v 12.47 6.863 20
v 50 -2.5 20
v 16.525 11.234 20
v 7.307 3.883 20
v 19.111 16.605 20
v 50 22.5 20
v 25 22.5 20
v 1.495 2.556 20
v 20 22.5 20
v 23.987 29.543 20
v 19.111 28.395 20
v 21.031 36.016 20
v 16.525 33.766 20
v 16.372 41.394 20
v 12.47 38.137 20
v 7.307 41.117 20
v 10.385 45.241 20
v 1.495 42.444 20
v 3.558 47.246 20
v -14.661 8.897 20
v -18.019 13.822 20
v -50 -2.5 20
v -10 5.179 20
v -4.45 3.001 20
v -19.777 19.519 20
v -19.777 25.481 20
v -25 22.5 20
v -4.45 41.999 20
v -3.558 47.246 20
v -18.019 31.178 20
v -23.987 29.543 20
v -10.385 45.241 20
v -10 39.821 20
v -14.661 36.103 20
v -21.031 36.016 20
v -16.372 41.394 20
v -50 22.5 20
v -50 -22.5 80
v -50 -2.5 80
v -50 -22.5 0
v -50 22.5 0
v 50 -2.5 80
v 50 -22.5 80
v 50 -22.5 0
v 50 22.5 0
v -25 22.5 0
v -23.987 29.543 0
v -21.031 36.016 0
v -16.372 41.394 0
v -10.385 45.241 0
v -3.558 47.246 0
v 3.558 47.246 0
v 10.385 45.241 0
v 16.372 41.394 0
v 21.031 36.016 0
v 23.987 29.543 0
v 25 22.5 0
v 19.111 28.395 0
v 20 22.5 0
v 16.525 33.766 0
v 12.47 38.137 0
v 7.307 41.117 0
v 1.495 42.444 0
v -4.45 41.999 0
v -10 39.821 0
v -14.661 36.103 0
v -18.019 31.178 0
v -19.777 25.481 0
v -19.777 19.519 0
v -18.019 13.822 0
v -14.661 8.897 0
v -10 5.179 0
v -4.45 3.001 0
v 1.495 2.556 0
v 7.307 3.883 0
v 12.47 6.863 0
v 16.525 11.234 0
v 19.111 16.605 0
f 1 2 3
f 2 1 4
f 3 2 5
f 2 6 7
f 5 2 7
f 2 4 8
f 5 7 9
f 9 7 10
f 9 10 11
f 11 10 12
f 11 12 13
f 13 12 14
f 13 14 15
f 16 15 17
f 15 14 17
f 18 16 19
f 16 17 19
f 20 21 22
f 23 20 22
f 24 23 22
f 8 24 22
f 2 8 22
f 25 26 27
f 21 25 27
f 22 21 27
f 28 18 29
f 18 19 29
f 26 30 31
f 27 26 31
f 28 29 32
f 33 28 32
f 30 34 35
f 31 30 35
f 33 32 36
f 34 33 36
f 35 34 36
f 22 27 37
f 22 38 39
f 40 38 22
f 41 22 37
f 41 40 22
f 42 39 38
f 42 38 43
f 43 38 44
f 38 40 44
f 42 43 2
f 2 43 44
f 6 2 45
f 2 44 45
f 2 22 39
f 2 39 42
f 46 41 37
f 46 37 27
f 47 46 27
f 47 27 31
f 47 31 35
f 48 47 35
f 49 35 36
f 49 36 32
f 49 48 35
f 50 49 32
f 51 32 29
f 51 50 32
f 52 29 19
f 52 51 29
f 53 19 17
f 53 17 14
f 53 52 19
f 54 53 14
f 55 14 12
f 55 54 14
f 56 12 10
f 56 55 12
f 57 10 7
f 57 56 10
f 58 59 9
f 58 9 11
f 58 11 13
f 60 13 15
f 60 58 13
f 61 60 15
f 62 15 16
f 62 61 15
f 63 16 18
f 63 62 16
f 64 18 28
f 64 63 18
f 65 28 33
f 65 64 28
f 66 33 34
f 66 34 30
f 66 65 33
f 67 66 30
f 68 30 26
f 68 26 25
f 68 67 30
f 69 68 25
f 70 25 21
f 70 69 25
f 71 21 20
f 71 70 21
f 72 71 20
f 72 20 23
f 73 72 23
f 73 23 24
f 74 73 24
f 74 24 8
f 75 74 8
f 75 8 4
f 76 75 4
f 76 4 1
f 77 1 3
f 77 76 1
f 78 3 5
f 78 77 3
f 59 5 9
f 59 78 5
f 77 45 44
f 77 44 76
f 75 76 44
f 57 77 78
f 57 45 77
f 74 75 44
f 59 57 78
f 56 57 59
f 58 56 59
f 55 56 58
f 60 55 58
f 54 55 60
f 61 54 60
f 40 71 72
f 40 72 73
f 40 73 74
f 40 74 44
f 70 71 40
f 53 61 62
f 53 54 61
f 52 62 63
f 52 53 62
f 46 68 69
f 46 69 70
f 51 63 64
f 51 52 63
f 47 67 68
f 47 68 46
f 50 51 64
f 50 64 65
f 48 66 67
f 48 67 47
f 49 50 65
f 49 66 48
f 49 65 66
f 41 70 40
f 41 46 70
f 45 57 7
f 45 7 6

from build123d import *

# Parameters (mm, degrees)
SKETCH1_R           = 20
BOSS_EXTRUDE1_DEPTH = 20
SKETCH2_W           = 100
SKETCH2_H           = 20
BOSS_EXTRUDE2_DEPTH = 60


with BuildPart() as part:
    # Sketch1 → Boss-Extrude1 (new body)
    with BuildSketch(Plane.XY):
        with BuildLine():
            Line((-50, 22.5), (-25, 22.5))
            ThreePointArc((-25, 22.5), (0, 47.5), (25, 22.5))
            Line((25, 22.5), (50, 22.5))
            Line((50, 22.5), (50, -22.5))
            Line((50, -22.5), (-50, -22.5))
            Line((-50, -22.5), (-50, 22.5))
        make_face()
        with Locations((0, 22.5)):
            Circle(SKETCH1_R, mode=Mode.SUBTRACT)
    extrude(amount=BOSS_EXTRUDE1_DEPTH)

    # Sketch2 → Boss-Extrude2 (add)
    with BuildSketch(Plane.XY.offset(20)):
        with Locations((0, -12.5)):
            Rectangle(SKETCH2_W, SKETCH2_H)
    extrude(amount=BOSS_EXTRUDE2_DEPTH)


solid = part.part
